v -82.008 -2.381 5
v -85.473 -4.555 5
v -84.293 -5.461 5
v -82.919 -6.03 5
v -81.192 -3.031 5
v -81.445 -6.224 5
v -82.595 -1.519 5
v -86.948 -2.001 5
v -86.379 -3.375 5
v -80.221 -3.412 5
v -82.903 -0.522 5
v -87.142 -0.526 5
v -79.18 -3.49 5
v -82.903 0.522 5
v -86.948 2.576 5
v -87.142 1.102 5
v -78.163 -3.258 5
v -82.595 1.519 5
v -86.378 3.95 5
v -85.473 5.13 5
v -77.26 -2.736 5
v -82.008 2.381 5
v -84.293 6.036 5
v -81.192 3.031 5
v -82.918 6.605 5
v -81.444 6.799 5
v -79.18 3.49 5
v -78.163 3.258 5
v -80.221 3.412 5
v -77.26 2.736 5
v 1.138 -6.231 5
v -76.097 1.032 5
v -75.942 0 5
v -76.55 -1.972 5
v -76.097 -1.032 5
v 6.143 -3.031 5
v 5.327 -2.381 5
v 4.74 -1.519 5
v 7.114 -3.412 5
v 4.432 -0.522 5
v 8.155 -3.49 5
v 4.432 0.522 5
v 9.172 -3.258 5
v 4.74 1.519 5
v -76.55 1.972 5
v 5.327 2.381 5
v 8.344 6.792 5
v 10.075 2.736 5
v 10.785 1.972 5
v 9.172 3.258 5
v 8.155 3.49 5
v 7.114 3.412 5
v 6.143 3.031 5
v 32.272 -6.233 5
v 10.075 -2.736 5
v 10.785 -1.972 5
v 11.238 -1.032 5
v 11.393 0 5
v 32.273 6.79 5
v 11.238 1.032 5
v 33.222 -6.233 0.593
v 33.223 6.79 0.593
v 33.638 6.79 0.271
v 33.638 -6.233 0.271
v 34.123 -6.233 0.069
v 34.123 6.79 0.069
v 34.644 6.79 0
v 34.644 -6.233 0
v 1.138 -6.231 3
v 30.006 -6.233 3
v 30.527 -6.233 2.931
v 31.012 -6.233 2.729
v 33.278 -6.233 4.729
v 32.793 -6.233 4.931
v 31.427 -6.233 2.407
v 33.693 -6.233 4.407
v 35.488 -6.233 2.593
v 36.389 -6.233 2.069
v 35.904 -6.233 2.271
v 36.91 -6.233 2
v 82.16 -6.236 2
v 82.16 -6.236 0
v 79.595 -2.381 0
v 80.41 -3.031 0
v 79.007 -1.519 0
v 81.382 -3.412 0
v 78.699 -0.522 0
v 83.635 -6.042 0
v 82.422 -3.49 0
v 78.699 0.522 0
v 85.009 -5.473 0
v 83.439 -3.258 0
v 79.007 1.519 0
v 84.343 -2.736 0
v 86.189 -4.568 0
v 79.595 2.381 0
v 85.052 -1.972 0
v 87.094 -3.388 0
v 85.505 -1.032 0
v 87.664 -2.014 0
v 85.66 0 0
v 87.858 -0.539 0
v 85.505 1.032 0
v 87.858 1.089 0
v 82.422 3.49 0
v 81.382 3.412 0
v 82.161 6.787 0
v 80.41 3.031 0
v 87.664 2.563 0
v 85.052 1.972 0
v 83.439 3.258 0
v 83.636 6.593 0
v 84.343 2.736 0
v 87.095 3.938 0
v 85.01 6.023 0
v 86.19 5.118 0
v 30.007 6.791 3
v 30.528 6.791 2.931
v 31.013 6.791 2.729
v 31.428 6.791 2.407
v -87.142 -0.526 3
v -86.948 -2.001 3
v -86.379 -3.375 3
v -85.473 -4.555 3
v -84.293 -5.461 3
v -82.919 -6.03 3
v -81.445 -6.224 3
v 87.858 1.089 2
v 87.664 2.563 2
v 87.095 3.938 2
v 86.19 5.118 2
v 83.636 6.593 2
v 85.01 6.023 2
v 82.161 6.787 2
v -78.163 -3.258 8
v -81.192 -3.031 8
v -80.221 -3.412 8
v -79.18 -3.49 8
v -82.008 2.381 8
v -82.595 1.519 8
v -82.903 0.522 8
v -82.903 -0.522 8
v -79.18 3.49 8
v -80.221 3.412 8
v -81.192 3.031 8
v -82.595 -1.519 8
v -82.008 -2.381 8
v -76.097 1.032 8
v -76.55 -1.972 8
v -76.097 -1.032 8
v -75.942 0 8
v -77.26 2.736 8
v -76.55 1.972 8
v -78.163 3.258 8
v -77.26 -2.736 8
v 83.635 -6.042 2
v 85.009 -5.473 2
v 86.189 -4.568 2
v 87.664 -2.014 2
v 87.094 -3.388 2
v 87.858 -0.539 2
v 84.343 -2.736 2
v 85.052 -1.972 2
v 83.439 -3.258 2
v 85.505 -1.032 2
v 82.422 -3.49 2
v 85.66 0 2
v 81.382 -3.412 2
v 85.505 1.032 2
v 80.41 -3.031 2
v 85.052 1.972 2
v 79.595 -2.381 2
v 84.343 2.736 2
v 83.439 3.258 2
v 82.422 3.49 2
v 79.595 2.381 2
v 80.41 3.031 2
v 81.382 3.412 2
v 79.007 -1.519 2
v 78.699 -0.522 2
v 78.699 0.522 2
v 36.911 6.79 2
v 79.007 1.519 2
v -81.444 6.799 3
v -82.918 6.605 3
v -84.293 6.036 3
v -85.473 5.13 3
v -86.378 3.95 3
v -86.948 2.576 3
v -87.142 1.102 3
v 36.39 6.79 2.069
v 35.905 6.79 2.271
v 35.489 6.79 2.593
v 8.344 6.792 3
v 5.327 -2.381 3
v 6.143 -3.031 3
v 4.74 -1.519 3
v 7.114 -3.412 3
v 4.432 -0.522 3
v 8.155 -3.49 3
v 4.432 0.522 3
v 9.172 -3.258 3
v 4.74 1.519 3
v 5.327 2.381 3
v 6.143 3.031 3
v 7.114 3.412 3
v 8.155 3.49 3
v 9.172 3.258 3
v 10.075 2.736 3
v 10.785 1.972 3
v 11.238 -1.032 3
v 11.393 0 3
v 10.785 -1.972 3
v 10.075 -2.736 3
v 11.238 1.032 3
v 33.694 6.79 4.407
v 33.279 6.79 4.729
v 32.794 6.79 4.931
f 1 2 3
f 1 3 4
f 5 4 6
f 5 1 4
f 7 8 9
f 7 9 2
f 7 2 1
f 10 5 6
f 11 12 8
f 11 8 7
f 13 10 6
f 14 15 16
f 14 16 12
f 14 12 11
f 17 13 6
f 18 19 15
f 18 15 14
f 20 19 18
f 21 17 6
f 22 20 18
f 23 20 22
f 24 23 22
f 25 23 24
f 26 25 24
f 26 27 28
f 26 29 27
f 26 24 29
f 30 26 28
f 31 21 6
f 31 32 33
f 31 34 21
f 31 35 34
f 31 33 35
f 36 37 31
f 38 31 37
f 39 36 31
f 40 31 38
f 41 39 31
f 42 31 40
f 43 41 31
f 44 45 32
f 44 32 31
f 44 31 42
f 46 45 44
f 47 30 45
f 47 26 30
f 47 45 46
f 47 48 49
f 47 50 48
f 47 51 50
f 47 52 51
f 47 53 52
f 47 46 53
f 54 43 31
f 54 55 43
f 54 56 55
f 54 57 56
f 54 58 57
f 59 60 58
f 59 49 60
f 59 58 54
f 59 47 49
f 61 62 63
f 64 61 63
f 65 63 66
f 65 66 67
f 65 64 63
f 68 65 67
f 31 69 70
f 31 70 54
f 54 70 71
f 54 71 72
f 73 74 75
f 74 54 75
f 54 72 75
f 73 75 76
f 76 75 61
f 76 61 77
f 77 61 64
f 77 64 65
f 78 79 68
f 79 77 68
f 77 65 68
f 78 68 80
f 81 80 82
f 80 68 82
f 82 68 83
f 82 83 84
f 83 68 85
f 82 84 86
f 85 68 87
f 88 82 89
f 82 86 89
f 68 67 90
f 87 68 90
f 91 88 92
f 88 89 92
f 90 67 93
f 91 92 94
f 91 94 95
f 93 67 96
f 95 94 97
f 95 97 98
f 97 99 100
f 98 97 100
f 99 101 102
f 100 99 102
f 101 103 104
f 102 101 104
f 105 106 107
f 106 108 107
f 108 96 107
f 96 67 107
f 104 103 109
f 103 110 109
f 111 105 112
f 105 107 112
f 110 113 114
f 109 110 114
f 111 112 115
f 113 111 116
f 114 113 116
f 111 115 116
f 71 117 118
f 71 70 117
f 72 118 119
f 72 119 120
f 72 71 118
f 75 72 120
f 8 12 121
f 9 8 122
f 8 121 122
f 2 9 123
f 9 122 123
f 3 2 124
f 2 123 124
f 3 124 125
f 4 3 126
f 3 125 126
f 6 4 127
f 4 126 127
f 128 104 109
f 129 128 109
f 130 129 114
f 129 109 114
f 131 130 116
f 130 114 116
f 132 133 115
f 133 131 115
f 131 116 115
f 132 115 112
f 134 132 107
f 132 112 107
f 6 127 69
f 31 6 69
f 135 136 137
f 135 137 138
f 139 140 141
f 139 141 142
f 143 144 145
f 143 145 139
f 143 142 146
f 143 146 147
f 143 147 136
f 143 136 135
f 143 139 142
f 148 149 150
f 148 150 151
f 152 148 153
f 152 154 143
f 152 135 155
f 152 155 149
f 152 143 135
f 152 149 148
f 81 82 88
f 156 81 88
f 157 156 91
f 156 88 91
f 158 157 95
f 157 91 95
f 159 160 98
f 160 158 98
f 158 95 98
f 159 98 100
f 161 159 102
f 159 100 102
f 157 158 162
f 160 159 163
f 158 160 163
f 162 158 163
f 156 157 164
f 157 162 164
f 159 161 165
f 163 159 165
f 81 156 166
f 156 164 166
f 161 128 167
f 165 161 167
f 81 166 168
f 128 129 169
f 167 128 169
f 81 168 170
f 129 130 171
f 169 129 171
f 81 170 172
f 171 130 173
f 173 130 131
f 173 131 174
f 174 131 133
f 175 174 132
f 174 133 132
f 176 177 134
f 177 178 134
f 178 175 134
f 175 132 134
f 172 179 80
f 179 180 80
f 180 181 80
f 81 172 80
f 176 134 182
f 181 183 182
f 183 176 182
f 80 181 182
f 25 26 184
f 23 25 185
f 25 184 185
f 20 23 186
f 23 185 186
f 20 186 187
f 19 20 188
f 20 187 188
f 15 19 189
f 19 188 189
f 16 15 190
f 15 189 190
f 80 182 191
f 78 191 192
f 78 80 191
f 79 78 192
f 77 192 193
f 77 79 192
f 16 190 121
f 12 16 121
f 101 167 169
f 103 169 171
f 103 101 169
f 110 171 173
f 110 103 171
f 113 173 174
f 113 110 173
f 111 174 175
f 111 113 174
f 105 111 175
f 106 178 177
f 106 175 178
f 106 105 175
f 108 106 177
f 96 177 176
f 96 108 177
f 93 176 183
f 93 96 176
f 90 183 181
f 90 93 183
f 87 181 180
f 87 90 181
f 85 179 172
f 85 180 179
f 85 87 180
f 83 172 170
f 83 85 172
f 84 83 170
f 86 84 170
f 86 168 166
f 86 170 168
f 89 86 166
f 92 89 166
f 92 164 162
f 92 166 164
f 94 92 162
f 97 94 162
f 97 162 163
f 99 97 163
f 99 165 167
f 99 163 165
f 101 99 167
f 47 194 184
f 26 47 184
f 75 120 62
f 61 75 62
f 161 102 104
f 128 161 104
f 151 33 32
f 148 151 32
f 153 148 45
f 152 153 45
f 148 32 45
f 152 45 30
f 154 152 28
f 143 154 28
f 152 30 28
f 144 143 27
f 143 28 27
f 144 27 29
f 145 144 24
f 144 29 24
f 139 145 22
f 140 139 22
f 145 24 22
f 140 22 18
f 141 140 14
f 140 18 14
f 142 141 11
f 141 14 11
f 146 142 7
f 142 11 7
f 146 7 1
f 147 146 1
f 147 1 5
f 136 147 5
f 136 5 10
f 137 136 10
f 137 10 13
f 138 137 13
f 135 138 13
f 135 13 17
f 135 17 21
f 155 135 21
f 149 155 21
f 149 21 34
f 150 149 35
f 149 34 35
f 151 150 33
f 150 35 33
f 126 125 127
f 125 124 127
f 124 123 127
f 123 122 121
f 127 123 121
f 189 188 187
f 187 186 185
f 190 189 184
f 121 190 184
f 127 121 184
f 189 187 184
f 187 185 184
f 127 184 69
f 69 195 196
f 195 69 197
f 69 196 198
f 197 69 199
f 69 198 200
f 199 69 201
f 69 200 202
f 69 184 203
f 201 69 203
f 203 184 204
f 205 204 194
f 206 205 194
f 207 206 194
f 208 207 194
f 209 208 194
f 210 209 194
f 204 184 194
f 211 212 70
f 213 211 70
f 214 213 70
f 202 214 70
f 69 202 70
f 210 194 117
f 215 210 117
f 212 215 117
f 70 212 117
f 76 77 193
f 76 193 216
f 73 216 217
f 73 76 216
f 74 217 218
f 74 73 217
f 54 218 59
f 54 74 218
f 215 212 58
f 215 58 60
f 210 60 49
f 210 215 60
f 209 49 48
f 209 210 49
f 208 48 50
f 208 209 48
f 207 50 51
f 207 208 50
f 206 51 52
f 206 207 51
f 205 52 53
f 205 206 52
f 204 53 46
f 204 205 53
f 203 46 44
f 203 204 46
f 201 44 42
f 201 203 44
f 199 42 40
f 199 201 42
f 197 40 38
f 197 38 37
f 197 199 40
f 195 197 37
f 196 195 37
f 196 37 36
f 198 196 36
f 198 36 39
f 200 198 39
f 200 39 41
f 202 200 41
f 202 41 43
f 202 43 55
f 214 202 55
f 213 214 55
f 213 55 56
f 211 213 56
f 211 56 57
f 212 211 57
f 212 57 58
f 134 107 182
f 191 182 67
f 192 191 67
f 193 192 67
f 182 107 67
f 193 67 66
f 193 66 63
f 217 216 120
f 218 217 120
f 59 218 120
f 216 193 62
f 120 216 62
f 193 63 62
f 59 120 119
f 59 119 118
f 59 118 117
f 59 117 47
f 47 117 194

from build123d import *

# Parameters (mm, degrees)
SKETCH1_R           = 3.5
BOSS_EXTRUDE6_DEPTH = 5
CUT_EXTRUDE5_DEPTH  = 14.035691085
FILLET3_R           = 2
SKETCH3_R           = 3.5
BOSS_EXTRUDE9_DEPTH = 3


with BuildPart() as part:
    # Sketch1 → Boss-Extrude6 (new body)
    with BuildSketch(Plane.XY):
        with BuildLine():
            Line((1.138484568, -6.230529798), (82.159951164, -6.236480839))
            ThreePointArc((82.159951164, -6.236480839), (86.188937946, -4.567966564), (87.858044062, -0.539224931))
            Line((87.858044062, -0.539224931), (87.858163632, 1.088682041))
            ThreePointArc((87.858163632, 1.088682041), (86.189649357, 5.117668823), (82.160907724, 6.786774939))
            Line((82.160907724, 6.786774939), (8.344270935, 6.792196785))
            Line((8.344270935, 6.792196785), (-81.443742997, 6.79879173))
            ThreePointArc((-81.443742997, 6.79879173), (-85.472729779, 5.130277455), (-87.141835896, 1.101535822))
            Line((-87.141835896, 1.101535822), (-87.141955466, -0.52637115))
            ThreePointArc((-87.141955466, -0.52637115), (-85.473441191, -4.555357932), (-81.444699558, -6.224464049))
            Line((-81.444699558, -6.224464049), (1.138484568, -6.230529798))
        make_face()
        with Locations((82.160369659, 0)):
            Circle(SKETCH1_R, mode=Mode.SUBTRACT)
        with Locations((7.893112659, 0)):
            Circle(SKETCH1_R, mode=Mode.SUBTRACT)
    extrude(amount=BOSS_EXTRUDE6_DEPTH)

    # Sketch4 → Cut-Extrude5 (cut, through all)
    with BuildSketch(Plane(origin=(0.000498933, 6.792809636, 0), x_dir=(0.999999997, -7.345e-05, 0), z_dir=(7.345e-05, 0.999999997, 0))):
        Polygon((-97.188212117, 0), (-97.188212117, -3), (30.840558875, -3), (33.809433044, 0), align=None)
        Polygon((36.07564421, -2), (33.106770041, -5), (91.140577756, -5), (91.140577756, -2), align=None)
    extrude(amount=-CUT_EXTRUDE5_DEPTH, mode=Mode.SUBTRACT)

    # Fillet3
    fillet3_edges = [part.edges().sort_by_distance(p)[0] for p in [
        (33.809453605, 0.278698438, 0),
        (30.840579445, 0.278916502, 3),
        (33.106790605, 0.278750049, 5),
        (36.075664766, 0.278531984, 2),
    ]]
    fillet(fillet3_edges, radius=FILLET3_R)

    # Sketch3 → Boss-Extrude9 (add)
    with BuildSketch(Plane.XY.offset(5)):
        with Locations((-79.441895681, 0)):
            Circle(SKETCH3_R)
    extrude(amount=BOSS_EXTRUDE9_DEPTH)


solid = part.part
